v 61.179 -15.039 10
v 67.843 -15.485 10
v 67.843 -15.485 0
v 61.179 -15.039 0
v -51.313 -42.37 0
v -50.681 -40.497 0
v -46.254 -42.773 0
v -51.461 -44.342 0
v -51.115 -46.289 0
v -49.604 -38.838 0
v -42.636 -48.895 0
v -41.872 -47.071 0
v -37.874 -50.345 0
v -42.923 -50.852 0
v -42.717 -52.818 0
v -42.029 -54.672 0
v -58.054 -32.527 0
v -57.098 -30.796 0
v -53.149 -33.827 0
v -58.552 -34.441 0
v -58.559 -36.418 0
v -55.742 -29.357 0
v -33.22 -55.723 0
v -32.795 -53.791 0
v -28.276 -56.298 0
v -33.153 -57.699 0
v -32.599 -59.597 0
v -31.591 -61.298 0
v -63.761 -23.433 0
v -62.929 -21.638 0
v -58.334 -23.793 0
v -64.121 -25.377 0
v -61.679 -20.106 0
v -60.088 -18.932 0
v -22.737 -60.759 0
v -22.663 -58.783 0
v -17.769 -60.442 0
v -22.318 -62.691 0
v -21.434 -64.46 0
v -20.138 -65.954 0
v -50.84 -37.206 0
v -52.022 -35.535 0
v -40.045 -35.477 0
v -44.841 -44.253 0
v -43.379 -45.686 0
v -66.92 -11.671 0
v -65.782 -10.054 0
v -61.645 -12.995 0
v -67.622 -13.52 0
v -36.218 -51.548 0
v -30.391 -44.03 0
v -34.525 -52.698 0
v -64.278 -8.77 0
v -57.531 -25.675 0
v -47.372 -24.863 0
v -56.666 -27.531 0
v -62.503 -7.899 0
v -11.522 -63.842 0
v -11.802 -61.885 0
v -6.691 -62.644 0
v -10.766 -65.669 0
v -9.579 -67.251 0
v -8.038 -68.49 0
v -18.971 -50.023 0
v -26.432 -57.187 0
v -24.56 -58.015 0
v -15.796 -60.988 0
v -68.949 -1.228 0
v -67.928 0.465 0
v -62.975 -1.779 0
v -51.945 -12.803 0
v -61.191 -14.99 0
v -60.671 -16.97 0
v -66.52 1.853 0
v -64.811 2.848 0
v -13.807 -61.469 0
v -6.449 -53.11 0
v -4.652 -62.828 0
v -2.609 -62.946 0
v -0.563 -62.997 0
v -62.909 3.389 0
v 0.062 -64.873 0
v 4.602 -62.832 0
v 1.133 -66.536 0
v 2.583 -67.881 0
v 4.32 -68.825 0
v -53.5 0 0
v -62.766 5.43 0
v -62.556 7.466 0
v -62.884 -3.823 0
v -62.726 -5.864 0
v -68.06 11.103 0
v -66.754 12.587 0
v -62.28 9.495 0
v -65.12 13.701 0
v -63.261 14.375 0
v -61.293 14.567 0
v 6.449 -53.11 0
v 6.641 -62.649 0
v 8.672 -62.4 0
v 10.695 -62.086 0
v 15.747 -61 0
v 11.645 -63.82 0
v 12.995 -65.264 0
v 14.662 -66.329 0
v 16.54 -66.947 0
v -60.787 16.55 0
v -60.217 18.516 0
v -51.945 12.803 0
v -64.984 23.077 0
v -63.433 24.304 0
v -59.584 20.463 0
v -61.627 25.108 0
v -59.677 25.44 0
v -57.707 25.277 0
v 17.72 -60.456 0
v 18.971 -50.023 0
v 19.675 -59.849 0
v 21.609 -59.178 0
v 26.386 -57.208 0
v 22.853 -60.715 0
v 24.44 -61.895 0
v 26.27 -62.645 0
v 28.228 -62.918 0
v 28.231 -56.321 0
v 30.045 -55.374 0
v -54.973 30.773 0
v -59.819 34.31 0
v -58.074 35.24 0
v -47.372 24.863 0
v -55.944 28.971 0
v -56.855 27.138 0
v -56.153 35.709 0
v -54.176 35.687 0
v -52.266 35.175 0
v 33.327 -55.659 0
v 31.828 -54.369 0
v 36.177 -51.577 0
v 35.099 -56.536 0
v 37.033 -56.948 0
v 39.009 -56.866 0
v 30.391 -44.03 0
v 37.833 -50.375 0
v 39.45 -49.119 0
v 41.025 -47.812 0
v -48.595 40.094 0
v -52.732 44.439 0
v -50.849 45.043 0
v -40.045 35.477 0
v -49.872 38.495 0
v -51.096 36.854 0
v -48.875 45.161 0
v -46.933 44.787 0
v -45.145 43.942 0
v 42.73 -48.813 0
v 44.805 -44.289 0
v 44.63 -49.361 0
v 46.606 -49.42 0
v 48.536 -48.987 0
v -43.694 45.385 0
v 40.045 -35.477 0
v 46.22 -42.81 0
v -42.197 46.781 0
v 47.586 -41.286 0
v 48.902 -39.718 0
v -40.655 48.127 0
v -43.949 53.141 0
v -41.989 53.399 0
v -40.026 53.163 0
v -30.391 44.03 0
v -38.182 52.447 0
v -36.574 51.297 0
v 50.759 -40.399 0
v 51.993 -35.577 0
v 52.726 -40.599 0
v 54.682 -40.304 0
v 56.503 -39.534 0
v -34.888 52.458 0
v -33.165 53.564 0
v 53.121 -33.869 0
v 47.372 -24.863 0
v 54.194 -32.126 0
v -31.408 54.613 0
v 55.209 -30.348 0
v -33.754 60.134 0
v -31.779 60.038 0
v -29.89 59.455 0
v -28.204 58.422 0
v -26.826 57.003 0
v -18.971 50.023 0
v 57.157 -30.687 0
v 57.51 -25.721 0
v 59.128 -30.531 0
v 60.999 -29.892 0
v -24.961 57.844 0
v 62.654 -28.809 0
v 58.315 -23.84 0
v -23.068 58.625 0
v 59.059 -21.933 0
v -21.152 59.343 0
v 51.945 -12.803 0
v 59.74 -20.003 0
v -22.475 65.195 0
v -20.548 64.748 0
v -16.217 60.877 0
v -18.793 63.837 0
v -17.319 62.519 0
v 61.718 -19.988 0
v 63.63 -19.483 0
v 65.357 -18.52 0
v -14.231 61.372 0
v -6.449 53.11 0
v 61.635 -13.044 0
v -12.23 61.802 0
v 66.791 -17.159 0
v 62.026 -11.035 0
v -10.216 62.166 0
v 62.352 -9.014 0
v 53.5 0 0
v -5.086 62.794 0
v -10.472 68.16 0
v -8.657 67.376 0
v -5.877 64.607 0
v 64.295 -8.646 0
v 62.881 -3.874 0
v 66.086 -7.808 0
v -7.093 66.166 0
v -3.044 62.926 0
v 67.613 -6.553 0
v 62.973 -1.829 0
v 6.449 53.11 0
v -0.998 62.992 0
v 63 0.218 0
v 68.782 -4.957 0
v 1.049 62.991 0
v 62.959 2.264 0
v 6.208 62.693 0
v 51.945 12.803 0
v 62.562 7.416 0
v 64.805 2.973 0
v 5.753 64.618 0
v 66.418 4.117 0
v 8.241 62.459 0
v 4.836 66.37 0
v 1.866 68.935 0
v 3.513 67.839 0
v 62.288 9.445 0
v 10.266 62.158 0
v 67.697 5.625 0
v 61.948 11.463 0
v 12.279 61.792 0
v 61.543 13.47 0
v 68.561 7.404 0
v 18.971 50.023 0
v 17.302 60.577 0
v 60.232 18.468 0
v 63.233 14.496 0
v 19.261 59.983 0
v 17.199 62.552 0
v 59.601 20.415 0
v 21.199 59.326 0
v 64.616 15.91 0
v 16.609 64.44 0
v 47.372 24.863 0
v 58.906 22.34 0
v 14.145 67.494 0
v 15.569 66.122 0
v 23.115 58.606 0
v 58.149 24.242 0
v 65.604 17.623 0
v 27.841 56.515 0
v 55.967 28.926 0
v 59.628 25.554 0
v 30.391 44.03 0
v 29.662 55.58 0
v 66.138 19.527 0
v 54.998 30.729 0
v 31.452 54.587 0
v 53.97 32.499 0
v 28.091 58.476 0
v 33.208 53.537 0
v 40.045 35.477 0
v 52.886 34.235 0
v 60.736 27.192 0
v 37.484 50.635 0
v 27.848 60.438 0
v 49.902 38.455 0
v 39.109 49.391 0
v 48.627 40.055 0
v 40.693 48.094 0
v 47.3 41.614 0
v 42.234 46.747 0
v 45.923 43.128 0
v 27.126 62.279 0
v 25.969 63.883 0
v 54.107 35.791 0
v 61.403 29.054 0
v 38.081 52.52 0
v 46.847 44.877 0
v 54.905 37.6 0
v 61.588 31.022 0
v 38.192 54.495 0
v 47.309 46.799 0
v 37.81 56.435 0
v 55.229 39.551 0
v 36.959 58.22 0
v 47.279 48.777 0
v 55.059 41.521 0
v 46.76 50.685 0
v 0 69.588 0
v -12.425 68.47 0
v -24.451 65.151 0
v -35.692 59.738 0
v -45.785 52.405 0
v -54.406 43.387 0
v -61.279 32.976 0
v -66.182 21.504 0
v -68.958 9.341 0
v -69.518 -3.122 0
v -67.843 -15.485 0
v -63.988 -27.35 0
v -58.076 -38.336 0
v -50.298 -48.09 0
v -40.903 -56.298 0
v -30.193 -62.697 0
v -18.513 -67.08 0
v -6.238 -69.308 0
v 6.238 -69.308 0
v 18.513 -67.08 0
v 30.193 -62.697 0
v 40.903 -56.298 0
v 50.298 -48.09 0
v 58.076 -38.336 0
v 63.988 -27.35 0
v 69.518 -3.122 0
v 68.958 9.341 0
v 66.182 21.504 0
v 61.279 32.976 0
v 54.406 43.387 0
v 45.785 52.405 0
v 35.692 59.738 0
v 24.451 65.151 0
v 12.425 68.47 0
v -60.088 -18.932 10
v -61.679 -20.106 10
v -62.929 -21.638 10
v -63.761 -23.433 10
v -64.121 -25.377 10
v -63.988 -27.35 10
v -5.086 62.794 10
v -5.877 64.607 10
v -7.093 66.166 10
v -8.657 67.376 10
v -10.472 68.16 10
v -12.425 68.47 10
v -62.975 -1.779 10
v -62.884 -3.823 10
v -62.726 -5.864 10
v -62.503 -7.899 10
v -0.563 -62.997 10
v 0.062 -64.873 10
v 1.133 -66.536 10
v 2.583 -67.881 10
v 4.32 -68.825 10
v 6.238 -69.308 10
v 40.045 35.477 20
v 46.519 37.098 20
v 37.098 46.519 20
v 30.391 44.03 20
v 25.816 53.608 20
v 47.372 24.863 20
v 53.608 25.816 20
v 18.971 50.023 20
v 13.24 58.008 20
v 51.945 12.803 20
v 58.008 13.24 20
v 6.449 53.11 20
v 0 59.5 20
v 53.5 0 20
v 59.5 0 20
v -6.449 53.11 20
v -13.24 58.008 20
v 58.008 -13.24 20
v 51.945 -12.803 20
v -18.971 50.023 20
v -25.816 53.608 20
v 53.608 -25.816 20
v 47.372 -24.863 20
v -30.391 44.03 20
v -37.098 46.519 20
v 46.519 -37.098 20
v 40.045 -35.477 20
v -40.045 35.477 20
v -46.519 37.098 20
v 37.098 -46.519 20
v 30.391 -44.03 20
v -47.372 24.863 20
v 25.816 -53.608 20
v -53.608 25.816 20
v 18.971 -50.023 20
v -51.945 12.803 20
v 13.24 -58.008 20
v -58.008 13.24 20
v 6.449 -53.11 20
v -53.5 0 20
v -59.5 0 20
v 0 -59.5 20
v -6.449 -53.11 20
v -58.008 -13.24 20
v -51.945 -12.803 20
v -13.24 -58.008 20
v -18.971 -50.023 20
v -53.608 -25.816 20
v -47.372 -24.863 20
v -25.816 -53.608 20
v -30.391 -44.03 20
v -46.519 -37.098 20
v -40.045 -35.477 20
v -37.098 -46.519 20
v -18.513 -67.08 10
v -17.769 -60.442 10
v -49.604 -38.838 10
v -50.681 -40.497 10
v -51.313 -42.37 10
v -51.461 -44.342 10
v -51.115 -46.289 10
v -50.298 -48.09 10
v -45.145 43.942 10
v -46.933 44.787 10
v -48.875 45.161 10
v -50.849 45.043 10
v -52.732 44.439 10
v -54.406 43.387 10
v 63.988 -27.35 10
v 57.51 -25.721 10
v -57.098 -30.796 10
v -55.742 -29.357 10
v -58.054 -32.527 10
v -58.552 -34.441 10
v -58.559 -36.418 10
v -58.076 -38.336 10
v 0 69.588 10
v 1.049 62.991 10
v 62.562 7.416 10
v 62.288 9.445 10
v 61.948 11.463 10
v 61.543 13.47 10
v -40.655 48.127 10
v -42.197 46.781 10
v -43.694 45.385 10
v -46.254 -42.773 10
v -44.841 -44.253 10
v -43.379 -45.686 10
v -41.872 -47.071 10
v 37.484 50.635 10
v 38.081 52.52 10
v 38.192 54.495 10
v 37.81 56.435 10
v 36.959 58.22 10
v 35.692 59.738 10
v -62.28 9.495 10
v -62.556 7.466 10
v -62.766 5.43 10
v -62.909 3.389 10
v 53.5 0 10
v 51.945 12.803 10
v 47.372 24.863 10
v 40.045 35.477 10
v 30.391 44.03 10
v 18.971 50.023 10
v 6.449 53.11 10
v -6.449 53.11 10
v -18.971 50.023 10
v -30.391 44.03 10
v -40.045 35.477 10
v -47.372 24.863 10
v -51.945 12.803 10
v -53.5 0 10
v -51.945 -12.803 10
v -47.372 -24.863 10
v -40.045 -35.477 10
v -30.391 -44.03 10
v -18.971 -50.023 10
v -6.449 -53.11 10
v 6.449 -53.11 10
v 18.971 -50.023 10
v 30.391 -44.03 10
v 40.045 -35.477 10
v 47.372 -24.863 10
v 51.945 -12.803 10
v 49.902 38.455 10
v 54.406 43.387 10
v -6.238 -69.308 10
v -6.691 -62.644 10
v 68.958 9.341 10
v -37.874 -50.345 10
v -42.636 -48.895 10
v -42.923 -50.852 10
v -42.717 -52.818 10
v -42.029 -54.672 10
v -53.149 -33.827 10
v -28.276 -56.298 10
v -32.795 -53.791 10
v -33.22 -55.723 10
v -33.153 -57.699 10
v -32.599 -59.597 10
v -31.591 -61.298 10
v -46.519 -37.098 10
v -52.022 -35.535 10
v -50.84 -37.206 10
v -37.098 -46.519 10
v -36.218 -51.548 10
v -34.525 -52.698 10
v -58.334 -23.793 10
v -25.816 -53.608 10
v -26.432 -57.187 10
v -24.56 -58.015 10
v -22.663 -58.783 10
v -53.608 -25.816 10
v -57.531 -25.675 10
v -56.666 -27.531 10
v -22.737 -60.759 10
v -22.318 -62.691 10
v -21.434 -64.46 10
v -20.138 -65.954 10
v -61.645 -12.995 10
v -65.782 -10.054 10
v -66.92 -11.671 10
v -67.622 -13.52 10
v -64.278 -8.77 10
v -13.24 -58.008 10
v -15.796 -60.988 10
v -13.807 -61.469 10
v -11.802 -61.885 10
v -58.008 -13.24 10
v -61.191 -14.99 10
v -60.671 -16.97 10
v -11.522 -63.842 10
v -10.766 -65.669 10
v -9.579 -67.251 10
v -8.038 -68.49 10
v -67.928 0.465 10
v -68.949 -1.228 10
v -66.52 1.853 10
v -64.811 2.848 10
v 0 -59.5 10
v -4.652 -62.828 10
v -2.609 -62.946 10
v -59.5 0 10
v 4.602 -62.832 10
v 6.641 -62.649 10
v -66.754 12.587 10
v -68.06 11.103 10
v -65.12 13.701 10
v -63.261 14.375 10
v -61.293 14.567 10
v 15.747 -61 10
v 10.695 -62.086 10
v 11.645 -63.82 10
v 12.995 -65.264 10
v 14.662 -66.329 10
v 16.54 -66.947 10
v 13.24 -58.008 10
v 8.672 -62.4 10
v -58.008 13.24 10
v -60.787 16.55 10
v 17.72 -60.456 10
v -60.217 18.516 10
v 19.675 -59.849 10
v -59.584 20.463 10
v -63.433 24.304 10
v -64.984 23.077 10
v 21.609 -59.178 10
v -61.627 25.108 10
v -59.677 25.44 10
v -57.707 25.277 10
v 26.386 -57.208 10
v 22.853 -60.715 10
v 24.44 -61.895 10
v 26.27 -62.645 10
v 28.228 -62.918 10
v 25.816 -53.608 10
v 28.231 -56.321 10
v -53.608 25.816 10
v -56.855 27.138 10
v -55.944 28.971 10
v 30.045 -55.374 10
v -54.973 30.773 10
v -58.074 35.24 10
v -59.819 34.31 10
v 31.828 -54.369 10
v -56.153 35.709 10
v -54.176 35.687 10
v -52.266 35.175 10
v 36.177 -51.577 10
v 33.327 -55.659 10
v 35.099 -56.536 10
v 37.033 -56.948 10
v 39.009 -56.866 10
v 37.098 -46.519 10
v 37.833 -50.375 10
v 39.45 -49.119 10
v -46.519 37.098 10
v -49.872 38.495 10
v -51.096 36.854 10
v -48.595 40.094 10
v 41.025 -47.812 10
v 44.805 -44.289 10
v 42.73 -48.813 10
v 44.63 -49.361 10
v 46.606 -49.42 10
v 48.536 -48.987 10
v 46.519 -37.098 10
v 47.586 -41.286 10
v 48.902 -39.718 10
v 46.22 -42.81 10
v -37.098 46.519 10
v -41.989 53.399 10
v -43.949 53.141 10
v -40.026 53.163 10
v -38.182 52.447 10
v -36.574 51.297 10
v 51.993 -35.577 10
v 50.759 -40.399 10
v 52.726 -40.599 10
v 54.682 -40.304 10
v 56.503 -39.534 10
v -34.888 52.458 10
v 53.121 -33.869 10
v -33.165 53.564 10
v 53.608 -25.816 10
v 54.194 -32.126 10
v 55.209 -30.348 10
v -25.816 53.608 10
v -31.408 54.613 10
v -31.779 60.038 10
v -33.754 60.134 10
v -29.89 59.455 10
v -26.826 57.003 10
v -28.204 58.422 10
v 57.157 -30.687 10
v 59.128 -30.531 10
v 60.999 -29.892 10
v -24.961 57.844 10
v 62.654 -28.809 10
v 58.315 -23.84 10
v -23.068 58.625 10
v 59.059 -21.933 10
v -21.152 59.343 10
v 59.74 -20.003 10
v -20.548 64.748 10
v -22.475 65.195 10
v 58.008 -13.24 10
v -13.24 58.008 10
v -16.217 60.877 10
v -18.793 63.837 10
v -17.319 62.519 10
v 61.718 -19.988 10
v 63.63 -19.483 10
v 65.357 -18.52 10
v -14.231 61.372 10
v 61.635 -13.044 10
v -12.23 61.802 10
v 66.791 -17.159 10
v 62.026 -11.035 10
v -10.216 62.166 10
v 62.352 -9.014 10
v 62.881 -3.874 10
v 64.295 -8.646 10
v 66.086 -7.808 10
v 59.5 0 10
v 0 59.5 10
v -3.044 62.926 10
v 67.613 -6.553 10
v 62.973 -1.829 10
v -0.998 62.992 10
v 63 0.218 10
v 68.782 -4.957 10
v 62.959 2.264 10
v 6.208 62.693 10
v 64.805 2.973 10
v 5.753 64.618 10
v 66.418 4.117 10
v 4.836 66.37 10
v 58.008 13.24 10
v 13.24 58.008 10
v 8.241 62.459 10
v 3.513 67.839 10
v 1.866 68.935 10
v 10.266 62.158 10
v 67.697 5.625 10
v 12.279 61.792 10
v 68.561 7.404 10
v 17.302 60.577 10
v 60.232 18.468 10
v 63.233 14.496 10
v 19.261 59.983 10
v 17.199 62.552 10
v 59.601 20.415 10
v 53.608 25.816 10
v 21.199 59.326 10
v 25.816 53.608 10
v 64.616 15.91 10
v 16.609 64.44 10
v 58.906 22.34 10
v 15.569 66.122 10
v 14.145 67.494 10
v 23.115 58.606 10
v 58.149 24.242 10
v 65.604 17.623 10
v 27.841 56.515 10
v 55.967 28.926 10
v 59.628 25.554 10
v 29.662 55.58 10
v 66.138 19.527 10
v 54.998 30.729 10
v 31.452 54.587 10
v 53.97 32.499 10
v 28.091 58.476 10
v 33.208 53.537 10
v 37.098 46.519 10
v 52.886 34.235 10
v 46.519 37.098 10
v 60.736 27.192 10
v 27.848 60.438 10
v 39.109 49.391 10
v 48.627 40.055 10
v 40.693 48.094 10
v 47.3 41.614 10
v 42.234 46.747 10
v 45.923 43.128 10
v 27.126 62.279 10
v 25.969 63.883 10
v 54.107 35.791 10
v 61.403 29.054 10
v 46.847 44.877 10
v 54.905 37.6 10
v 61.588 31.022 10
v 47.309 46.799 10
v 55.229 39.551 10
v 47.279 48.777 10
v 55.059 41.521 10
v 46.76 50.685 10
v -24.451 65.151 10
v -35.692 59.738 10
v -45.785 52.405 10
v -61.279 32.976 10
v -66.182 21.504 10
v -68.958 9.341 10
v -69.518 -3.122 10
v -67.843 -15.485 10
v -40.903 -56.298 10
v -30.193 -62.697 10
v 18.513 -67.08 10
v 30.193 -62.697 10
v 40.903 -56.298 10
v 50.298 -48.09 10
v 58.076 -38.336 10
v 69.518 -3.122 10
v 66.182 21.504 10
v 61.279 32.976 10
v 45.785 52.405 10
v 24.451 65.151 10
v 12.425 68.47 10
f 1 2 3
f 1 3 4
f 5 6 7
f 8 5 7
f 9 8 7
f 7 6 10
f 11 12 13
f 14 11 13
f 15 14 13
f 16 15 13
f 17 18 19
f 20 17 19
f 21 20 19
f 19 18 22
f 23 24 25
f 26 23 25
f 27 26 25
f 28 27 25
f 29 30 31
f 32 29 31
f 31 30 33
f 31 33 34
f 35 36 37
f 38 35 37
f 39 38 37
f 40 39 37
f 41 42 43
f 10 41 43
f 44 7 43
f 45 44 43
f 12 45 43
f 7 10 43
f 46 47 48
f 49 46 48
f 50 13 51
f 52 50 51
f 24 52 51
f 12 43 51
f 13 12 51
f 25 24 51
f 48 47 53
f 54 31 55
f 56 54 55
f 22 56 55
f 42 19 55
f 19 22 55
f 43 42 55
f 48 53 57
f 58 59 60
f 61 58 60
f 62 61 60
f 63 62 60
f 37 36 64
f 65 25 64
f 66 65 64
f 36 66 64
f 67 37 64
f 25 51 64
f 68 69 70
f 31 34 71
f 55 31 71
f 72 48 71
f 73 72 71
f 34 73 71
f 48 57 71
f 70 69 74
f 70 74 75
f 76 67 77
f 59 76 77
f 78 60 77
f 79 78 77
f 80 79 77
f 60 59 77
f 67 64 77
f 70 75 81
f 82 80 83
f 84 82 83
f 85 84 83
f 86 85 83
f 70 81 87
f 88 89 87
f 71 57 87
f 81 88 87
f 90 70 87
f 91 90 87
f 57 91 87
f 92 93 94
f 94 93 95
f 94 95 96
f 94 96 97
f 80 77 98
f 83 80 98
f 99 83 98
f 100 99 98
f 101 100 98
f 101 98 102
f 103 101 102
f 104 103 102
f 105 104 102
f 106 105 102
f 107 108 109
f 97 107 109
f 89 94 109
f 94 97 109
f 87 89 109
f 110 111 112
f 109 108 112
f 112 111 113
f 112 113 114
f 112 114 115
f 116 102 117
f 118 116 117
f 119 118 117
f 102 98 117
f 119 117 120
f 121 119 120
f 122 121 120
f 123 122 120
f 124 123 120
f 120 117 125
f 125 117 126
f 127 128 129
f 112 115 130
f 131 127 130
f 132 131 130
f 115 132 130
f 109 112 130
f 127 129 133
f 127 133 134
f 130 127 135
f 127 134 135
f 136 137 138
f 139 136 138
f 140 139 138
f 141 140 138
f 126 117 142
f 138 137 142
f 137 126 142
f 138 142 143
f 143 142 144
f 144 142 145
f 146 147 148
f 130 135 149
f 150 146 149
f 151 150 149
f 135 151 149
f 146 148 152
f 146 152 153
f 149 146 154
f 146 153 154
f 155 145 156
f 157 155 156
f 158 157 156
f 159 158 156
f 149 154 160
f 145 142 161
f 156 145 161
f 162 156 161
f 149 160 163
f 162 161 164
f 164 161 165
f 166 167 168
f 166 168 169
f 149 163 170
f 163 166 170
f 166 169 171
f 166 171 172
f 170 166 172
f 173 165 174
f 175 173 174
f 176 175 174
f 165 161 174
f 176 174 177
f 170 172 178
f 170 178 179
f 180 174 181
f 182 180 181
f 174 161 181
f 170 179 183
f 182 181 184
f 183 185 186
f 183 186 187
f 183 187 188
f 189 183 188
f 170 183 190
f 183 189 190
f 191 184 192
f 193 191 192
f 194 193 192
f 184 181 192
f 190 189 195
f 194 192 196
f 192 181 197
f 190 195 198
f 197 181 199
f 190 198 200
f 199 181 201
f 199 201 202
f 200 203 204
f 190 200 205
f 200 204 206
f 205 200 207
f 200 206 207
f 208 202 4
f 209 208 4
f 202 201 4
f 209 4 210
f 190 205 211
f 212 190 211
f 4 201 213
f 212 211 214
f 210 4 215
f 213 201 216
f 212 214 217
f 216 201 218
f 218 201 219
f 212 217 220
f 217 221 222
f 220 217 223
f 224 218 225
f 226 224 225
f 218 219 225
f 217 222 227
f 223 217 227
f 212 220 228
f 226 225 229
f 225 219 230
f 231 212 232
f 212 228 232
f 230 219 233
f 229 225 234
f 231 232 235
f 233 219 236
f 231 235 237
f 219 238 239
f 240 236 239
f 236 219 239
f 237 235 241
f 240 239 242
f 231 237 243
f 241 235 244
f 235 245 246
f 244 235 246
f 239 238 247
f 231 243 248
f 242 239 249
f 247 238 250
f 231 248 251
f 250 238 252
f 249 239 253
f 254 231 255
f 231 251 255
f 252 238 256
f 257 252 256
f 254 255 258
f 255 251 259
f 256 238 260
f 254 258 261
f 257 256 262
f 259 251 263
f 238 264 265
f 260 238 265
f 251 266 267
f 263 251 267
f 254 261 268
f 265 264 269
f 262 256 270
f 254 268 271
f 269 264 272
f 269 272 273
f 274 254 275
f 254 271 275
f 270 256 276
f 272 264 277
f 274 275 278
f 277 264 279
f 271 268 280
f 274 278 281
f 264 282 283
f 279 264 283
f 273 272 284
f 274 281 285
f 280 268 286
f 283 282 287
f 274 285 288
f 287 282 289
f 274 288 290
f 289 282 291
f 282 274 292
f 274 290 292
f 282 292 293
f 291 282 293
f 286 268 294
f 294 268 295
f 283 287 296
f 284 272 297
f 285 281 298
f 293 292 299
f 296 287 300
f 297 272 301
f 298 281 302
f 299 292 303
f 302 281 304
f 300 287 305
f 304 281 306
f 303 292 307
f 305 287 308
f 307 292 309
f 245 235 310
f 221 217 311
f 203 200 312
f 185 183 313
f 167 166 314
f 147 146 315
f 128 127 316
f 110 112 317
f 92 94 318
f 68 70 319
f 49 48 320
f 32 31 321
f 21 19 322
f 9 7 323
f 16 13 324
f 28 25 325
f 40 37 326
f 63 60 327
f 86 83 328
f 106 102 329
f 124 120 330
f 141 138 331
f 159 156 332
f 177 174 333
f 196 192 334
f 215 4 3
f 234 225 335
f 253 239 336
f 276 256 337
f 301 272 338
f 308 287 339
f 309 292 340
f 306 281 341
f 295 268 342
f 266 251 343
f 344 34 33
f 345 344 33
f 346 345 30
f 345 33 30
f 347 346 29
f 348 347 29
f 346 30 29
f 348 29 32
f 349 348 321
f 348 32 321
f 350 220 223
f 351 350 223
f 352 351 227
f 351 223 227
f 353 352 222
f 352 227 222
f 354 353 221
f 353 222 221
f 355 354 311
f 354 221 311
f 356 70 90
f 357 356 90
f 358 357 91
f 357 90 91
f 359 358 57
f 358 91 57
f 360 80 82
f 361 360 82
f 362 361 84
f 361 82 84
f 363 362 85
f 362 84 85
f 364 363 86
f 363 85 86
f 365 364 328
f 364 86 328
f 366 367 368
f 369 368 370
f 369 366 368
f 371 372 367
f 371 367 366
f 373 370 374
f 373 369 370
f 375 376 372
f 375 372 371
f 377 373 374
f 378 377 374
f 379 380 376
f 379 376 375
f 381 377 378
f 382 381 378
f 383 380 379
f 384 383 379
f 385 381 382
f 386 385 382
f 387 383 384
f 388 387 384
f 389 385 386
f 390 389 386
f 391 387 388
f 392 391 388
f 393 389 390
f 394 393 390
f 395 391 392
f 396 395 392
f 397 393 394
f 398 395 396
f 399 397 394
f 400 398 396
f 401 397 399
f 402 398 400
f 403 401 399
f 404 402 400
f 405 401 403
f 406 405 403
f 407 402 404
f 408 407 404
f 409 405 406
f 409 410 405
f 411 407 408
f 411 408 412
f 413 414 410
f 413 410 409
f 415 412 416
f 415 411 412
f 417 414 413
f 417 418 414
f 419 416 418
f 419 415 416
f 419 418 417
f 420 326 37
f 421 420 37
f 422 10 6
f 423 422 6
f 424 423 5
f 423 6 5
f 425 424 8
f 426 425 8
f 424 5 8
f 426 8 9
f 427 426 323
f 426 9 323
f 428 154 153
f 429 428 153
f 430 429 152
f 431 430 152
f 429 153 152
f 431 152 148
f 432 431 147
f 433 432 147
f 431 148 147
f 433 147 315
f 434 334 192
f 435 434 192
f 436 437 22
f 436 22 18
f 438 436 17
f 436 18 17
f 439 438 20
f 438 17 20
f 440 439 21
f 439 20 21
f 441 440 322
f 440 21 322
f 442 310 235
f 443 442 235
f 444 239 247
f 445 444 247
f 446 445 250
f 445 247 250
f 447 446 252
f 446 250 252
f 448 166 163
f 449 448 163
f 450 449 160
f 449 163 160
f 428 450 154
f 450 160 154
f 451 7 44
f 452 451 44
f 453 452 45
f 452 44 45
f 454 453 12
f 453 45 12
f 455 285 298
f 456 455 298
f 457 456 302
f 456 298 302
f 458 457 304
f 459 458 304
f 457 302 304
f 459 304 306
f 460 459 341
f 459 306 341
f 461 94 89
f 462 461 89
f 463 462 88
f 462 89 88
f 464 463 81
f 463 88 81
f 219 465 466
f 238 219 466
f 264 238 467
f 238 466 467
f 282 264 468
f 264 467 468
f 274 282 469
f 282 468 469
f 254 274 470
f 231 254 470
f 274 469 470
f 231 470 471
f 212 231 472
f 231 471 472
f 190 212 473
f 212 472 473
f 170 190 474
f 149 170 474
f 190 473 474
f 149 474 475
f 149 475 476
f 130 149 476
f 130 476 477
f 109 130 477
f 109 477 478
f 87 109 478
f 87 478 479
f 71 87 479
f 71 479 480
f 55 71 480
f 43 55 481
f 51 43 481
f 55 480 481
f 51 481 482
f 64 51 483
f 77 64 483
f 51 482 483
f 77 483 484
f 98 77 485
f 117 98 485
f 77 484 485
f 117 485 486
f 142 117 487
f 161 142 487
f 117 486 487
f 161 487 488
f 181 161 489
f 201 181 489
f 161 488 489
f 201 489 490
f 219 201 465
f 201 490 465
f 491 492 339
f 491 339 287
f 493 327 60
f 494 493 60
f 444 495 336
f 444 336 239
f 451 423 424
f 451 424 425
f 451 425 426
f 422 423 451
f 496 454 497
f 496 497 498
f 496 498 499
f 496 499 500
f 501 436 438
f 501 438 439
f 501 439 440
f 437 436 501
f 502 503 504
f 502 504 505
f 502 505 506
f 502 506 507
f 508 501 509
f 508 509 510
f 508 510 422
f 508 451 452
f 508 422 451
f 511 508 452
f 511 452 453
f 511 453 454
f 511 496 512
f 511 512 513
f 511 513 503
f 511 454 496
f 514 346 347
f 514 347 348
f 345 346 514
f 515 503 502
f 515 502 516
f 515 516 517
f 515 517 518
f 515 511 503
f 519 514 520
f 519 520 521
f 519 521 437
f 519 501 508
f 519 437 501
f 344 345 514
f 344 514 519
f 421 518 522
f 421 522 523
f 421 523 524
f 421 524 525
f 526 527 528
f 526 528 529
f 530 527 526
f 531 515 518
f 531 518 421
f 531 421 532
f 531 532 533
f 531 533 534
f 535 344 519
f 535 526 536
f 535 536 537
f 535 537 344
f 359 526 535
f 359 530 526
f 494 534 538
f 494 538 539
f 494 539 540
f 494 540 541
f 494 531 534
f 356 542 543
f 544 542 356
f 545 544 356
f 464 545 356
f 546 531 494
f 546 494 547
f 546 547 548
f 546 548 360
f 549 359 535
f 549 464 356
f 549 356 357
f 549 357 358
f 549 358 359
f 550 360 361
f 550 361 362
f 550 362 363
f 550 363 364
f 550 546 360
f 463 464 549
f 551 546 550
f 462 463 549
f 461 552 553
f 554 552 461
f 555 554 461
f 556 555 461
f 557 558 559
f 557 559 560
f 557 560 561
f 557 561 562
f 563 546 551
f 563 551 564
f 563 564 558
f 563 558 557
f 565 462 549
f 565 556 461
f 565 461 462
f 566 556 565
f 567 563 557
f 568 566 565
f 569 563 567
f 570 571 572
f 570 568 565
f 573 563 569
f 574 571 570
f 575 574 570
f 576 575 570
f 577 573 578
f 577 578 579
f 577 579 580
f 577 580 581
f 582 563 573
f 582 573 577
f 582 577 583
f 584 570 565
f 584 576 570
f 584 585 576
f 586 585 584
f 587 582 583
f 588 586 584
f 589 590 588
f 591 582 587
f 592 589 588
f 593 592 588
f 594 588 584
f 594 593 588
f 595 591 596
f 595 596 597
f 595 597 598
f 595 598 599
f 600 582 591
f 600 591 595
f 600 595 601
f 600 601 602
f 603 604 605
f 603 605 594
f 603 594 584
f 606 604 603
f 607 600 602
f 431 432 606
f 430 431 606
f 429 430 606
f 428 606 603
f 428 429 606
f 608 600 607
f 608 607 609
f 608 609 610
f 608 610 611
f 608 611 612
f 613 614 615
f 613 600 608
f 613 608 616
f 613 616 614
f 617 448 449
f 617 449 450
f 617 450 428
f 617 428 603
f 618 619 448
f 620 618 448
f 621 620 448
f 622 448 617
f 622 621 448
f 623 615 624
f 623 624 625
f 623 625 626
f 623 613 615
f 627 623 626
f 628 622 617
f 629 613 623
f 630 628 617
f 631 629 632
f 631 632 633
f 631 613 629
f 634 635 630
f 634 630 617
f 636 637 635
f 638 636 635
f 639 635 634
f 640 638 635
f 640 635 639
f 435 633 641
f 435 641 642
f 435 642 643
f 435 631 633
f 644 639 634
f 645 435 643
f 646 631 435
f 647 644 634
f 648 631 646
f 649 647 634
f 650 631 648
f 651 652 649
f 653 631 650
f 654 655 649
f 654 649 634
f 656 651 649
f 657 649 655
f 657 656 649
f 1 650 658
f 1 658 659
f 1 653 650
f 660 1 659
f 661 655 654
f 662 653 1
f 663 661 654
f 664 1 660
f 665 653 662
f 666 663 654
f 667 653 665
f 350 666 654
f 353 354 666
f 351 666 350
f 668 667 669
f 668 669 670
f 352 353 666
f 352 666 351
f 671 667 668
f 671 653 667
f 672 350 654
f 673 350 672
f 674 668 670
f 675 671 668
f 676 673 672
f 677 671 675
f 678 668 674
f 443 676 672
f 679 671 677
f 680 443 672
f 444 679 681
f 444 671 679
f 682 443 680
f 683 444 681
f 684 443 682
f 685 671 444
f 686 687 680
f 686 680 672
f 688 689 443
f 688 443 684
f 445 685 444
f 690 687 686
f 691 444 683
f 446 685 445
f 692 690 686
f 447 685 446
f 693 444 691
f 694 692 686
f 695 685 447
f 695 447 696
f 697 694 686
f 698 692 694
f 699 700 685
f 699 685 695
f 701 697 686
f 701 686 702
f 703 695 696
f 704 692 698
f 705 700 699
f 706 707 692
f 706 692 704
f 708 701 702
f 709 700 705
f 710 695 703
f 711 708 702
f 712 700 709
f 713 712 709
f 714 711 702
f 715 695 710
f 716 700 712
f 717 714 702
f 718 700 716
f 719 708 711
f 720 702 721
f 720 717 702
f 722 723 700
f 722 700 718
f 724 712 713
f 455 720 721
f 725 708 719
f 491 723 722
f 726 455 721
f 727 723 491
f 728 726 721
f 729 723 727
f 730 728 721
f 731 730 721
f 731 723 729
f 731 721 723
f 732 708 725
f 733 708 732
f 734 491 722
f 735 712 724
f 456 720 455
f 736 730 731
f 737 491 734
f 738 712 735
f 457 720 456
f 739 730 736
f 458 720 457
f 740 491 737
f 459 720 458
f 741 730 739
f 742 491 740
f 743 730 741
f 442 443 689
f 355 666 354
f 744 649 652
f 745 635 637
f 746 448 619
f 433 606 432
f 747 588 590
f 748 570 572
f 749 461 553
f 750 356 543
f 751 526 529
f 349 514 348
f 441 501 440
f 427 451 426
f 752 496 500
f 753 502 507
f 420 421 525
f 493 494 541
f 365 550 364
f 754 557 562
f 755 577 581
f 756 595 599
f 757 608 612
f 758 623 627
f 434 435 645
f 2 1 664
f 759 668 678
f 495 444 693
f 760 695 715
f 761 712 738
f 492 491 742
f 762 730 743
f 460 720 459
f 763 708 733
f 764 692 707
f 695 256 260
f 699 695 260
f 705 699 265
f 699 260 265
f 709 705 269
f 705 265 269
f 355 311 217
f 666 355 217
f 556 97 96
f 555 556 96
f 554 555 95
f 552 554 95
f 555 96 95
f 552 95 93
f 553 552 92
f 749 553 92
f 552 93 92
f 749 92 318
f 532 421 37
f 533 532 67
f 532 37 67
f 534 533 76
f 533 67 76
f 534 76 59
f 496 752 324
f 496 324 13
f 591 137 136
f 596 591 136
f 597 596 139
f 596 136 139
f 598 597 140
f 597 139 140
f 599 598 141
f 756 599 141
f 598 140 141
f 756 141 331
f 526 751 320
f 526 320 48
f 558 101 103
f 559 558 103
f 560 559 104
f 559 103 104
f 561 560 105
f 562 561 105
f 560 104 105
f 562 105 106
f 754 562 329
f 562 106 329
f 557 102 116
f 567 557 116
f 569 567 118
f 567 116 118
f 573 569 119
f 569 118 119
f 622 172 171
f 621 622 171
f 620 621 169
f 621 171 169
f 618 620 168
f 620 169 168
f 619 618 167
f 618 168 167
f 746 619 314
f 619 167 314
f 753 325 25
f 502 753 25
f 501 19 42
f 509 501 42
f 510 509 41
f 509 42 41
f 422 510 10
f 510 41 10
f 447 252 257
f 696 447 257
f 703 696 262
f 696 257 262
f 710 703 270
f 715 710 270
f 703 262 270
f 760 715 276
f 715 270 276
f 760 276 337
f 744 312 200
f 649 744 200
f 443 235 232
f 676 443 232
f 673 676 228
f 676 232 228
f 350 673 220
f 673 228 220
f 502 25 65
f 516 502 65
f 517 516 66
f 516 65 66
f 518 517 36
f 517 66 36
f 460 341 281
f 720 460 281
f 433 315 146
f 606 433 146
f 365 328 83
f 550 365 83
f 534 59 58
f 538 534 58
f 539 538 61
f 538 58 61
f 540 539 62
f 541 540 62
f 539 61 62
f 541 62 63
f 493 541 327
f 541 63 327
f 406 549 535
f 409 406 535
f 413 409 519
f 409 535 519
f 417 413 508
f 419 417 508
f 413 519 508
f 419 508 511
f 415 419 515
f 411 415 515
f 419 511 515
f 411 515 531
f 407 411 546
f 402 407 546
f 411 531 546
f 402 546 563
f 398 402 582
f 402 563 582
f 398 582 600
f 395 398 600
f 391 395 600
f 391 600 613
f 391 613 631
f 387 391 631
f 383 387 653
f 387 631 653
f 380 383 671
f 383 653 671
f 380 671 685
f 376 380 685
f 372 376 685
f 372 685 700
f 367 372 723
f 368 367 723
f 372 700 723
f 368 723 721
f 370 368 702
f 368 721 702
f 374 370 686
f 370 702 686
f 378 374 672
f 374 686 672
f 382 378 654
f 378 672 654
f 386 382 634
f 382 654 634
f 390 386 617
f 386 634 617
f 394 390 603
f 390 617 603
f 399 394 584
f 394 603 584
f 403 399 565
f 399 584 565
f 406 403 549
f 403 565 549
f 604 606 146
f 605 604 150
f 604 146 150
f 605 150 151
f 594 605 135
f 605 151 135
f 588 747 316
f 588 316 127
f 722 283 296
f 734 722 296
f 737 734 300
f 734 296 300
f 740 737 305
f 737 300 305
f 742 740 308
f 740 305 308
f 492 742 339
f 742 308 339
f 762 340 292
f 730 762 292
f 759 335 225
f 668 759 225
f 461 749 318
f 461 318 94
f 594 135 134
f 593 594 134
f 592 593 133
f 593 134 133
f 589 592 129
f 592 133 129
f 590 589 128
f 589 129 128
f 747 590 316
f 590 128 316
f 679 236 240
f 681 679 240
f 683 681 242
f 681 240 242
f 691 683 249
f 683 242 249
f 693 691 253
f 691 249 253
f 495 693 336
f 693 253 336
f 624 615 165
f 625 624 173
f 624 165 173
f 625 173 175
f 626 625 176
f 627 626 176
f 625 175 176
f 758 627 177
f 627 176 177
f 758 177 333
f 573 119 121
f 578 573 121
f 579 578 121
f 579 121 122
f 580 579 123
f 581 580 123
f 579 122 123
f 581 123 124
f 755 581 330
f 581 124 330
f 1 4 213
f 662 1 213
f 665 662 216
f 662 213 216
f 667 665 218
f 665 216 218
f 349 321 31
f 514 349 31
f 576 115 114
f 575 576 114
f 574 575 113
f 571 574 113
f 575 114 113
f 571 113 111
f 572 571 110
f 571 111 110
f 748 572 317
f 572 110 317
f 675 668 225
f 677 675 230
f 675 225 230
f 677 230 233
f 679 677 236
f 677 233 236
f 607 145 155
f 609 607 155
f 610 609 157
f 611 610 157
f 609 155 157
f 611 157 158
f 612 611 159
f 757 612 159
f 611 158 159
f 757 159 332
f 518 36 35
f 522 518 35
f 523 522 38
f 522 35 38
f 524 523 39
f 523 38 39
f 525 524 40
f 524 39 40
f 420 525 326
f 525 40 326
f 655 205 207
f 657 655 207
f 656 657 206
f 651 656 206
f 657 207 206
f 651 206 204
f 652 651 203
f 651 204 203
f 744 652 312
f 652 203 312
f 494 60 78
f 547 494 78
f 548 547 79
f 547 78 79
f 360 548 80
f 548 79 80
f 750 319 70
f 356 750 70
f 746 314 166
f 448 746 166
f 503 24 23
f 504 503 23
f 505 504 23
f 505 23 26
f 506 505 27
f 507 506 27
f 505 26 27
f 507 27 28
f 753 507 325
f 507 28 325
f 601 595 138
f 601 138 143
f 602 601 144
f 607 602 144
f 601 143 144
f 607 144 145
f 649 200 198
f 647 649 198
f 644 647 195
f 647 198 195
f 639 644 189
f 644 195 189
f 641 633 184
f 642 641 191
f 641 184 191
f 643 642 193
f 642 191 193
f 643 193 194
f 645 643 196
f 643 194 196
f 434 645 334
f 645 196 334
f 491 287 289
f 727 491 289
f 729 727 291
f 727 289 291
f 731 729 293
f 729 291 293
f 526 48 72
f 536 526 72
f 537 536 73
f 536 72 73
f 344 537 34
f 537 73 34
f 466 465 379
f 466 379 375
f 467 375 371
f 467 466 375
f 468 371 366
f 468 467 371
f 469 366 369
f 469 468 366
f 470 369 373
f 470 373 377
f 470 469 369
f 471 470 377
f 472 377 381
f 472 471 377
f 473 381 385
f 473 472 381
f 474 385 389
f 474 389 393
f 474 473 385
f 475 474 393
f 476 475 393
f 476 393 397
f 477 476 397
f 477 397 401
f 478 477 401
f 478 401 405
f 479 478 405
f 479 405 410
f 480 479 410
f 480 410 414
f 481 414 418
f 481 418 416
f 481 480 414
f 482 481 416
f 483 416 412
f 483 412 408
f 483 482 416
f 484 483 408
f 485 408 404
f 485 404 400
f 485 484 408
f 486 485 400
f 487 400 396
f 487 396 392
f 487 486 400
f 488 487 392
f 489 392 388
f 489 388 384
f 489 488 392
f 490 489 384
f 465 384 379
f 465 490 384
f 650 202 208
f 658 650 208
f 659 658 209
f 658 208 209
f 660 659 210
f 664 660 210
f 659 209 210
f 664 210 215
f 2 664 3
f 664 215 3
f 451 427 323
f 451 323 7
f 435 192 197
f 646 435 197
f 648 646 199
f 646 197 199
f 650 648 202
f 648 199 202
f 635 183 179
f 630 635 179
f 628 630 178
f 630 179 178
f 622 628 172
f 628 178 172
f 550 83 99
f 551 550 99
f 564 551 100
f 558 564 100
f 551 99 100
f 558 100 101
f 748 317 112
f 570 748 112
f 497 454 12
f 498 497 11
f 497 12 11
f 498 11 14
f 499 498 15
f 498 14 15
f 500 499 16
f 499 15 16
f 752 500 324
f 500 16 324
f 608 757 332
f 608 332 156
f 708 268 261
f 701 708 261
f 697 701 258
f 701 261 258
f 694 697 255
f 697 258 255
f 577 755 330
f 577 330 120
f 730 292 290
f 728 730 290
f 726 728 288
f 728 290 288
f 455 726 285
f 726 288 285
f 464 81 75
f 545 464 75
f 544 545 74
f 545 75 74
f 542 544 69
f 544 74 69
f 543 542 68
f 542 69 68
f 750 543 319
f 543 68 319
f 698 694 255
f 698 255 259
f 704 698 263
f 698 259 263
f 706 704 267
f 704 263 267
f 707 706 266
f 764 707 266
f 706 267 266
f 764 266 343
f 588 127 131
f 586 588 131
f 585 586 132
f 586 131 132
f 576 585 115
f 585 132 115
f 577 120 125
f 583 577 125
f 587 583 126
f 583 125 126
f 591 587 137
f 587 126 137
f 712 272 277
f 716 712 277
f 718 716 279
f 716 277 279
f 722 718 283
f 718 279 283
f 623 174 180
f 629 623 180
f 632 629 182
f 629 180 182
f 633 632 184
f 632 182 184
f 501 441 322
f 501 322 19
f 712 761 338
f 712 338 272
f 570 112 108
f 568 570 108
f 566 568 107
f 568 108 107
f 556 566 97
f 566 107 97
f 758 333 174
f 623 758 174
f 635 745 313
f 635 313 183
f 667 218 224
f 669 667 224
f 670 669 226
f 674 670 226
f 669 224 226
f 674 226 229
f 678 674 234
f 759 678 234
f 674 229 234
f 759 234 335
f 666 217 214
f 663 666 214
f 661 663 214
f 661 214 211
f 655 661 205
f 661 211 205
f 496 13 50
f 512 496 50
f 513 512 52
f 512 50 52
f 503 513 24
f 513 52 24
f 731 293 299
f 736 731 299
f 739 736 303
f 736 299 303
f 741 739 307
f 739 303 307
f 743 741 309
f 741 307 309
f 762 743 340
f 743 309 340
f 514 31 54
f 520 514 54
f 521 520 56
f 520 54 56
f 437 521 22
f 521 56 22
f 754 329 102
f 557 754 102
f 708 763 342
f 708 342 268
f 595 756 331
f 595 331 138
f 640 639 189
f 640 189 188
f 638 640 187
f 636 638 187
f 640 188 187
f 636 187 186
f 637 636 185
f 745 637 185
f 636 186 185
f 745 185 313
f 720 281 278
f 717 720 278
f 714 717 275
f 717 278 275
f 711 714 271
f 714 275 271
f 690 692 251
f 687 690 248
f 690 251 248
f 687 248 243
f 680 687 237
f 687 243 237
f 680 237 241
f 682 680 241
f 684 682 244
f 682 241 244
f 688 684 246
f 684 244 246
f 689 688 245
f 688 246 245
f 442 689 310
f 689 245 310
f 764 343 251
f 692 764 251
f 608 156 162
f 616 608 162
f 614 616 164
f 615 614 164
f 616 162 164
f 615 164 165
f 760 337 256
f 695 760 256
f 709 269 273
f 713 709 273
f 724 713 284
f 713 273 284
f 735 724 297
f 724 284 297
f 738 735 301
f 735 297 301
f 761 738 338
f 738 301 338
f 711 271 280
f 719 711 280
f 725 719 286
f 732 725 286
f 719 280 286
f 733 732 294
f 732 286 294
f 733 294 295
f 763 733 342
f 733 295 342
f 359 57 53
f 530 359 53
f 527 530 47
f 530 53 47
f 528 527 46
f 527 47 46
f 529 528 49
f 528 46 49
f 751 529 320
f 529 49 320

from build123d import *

# Parameters (mm, degrees)
BOSS_EXTRUDE1_DEPTH = 10
SKETCH2_R           = 59.5
SKETCH2_R_2         = 53.5
BOSS_EXTRUDE2_DEPTH = 10
SKETCH3_R           = 53.5
CUT_EXTRUDE4_DEPTH  = 10


with BuildPart() as part:
    # Sketch1 → Boss-Extrude1 (new body)
    with BuildSketch(Plane.XY):
        with BuildLine():
            Line((0, 69.588014501), (1.048611539, 62.991272521))
            ThreePointArc((1.048611539, 62.991272521), (-2.021331039, 62.967564832), (-5.0864736, 62.794329253))
            ThreePointArc((-5.0864736, 62.794329253), (-7.836974129, 66.820360054), (-12.425419784, 68.469706479))
            Line((-12.425419784, 68.469706479), (-10.2157661, 62.166213677))
            ThreePointArc((-10.2157661, 62.166213677), (-13.232140267, 61.594727566), (-16.217092319, 60.876973617))
            ThreePointArc((-16.217092319, 60.876973617), (-19.642266731, 64.347183613), (-24.451476353, 65.150725754))
            Line((-24.451476353, 65.150725754), (-21.151800612, 59.343081576))
            ThreePointArc((-21.151800612, 59.343081576), (-24.017657619, 58.242185077), (-26.826480348, 57.002981958))
            ThreePointArc((-26.826480348, 57.002981958), (-30.816240719, 59.805835745), (-35.691642354, 59.737747098))
            Line((-35.691642354, 59.737747098), (-31.407998848, 54.612614004))
            ThreePointArc((-31.407998848, 54.612614004), (-34.031227694, 53.017690837), (-36.573643225, 51.296867558))
            ThreePointArc((-36.573643225, 51.296867558), (-40.999755374, 53.342279108), (-45.784649601, 52.404748097))
            Line((-45.784649601, 52.404748097), (-40.654718159, 48.126852083))
            ThreePointArc((-40.654718159, 48.126852083), (-42.951006109, 46.08916439), (-45.145299116, 43.942029627))
            ThreePointArc((-45.145299116, 43.942029627), (-49.865504157, 45.164257731), (-54.406100539, 43.387417373))
            Line((-54.406100539, 43.387417373), (-48.594761377, 40.094253538))
            ThreePointArc((-48.594761377, 40.094253538), (-50.490303849, 37.679294278), (-52.265947947, 35.174858708))
            ThreePointArc((-52.265947947, 35.174858708), (-57.128534607, 35.534619949), (-61.27889464, 32.975579356))
            Line((-61.27889464, 32.975579356), (-54.97292898, 30.772992693))
            ThreePointArc((-54.97292898, 30.772992693), (-56.406801678, 28.058380645), (-57.706726208, 25.277138889))
            ThreePointArc((-57.706726208, 25.277138889), (-62.555406949, 24.762870243), (-66.182134647, 21.503879086))
            Line((-66.182134647, 21.503879086), (-59.584221415, 20.462662544))
            ThreePointArc((-59.584221415, 20.462662544), (-60.510338491, 17.535647571), (-61.292762806, 14.566991027))
            ThreePointArc((-61.292762806, 14.566991027), (-65.97169704, 13.195221514), (-68.958226392, 9.341026448))
            Line((-68.958226392, 9.341026448), (-62.280427947, 9.494645584))
            ThreePointArc((-62.280427947, 9.494645584), (-62.669023236, 6.449304357), (-62.908799576, 3.388648088))
            ThreePointArc((-62.908799576, 3.388648088), (-67.267602508, 1.203467507), (-69.517944001, -3.122054465))
            Line((-69.517944001, -3.122054465), (-62.97489028, -1.778537098))
            ThreePointArc((-62.97489028, -1.778537098), (-62.81347401, -4.844324807), (-62.502895767, -7.898608789))
            ThreePointArc((-62.502895767, -7.898608789), (-66.401471883, -10.826966935), (-67.84329769, -15.484789979))
            Line((-67.84329769, -15.484789979), (-61.645287824, -12.994556134))
            ThreePointArc((-61.645287824, -12.994556134), (-60.939048046, -15.982253385), (-60.088097459, -18.93199788))
            ThreePointArc((-60.088097459, -18.93199788), (-63.401143316, -22.509413752), (-63.98811197, -27.349831602))
            Line((-63.98811197, -27.349831602), (-58.334355095, -23.792919443))
            ThreePointArc((-58.334355095, -23.792919443), (-57.105990937, -26.606499189), (-55.742018259, -29.356896982))
            ThreePointArc((-55.742018259, -29.356896982), (-58.363049836, -33.468389489), (-58.076295682, -38.335827134))
            Line((-58.076295682, -38.335827134), (-53.148508196, -33.826558745))
            ThreePointArc((-53.148508196, -33.826558745), (-51.437500293, -36.375590217), (-49.604344727, -38.83824126))
            ThreePointArc((-49.604344727, -38.83824126), (-51.449119914, -43.351663651), (-50.297859465, -48.089677639))
            Line((-50.297859465, -48.089677639), (-46.254424513, -42.772984617))
            ThreePointArc((-46.254424513, -42.772984617), (-44.115766066, -44.975539846), (-41.872346741, -47.071292508))
            ThreePointArc((-41.872346741, -47.071292508), (-42.881572944, -51.841579673), (-40.90280866, -56.297886336))
            Line((-40.90280866, -56.297886336), (-37.873685567, -50.344651569))
            ThreePointArc((-37.873685567, -50.344651569), (-35.376114819, -52.129938618), (-32.794537078, -53.791433684))
            ThreePointArc((-32.794537078, -53.791433684), (-32.935776938, -58.665264669), (-30.193107929, -62.696634645))
            Line((-30.193107929, -62.696634645), (-28.275655205, -56.298199996))
            ThreePointArc((-28.275655205, -56.298199996), (-25.499446135, -57.60883827), (-22.66268401, -58.782673922))
            ThreePointArc((-22.66268401, -58.782673922), (-21.931397961, -63.603399789), (-18.512975867, -67.080261528))
            Line((-18.512975867, -67.080261528), (-17.768822019, -60.442277952))
            ThreePointArc((-17.768822019, -60.442277952), (-14.80320427, -61.23614246), (-11.802433631, -61.884590654))
            ThreePointArc((-11.802433631, -61.884590654), (-10.222125808, -66.497269306), (-6.237821528, -69.307873613))
            Line((-6.237821528, -69.307873613), (-6.690884273, -62.643691363))
            ThreePointArc((-6.690884273, -62.643691363), (-3.631175241, -62.895266645), (-0.562843324, -62.997485723))
            ThreePointArc((-0.562843324, -62.997485723), (1.815693879, -67.253861874), (6.237821528, -69.307873613))
            Line((6.237821528, -69.307873613), (4.602103998, -62.831684991))
            ThreePointArc((4.602103998, -62.831684991), (7.657562749, -62.53288521), (10.69483723, -62.085589766))
            ThreePointArc((10.69483723, -62.085589766), (13.795155671, -65.848859984), (18.512975867, -67.080261528))
            Line((18.512975867, -67.080261528), (15.74717686, -61.000216565))
            ThreePointArc((15.74717686, -61.000216565), (18.700180371, -60.160645393), (21.608776916, -59.17821187))
            ThreePointArc((21.608776916, -59.17821187), (25.331229809, -62.327421554), (30.193107929, -62.696634645))
            Line((30.193107929, -62.696634645), (26.386122502, -57.208150987))
            ThreePointArc((26.386122502, -57.208150987), (29.14175881, -55.854792932), (31.828192733, -54.368797553))
            ThreePointArc((31.828192733, -54.368797553), (36.053137378, -56.802728512), (40.90280866, -56.297886336))
            Line((40.90280866, -56.297886336), (36.176996455, -51.577368365))
            ThreePointArc((36.176996455, -51.577368365), (38.646697142, -49.753721469), (41.024624246, -47.811925348))
            ThreePointArc((41.024624246, -47.811925348), (45.616267447, -49.452349038), (50.297859465, -48.089677639))
            Line((50.297859465, -48.089677639), (44.805111976, -44.288846686))
            ThreePointArc((44.805111976, -44.288846686), (46.90949883, -42.05352446), (48.902490582, -39.718338522))
            ThreePointArc((48.902490582, -39.718338522), (53.713253147, -40.512530377), (58.076295682, -38.335827134))
            Line((58.076295682, -38.335827134), (51.993154332, -35.576845034))
            ThreePointArc((51.993154332, -35.576845034), (53.664590628, -33.001692573), (55.208590632, -30.348171615))
            ThreePointArc((55.208590632, -30.348171615), (60.083850696, -30.270605655), (63.98811197, -27.349831602))
            Line((63.98811197, -27.349831602), (57.510093928, -25.72137431))
            ThreePointArc((57.510093928, -25.72137431), (58.694858328, -22.889159134), (59.740241154, -20.002589503))
            ThreePointArc((59.740241154, -20.002589503), (64.523303846, -19.055758761), (67.84329769, -15.484789979))
            Line((67.84329769, -15.484789979), (61.178611786, -15.039197451))
            ThreePointArc((61.178611786, -15.039197451), (61.838624987, -12.040949286), (62.351791171, -9.014107705))
            ThreePointArc((62.351791171, -9.014107705), (66.888924921, -7.228444101), (69.517944001, -3.122054465))
            Line((69.517944001, -3.122054465), (62.880798722, -3.873648413))
            ThreePointArc((62.880798722, -3.873648413), (62.994847358, -0.805733421), (62.959303317, 2.264094931))
            ThreePointArc((62.959303317, 2.264094931), (67.104680912, 4.8311987), (68.958226392, 9.341026448))
            Line((68.958226392, 9.341026448), (62.56194505, 7.416402873))
            ThreePointArc((62.56194505, 7.416402873), (62.126363502, 10.455379379), (61.543251651, 13.469527693))
            ThreePointArc((61.543251651, 13.469527693), (65.163637245, 16.735562799), (66.182134647, 21.503879086))
            Line((66.182134647, 21.503879086), (60.232298987, 18.468084869))
            ThreePointArc((60.232298987, 18.468084869), (59.261087206, 21.380447683), (58.149149238, 24.242038752))
            ThreePointArc((58.149149238, 24.242038752), (61.12818066, 28.10203214), (61.27889464, 32.975579356))
            Line((61.27889464, 32.975579356), (55.966737276, 28.926187421))
            ThreePointArc((55.966737276, 28.926187421), (54.491110807, 31.618330807), (52.886085324, 34.235390739))
            ThreePointArc((52.886085324, 34.235390739), (55.128014052, 38.565279046), (54.406100539, 43.387417373))
            Line((54.406100539, 43.387417373), (49.902358579, 38.454578509))
            ThreePointArc((49.902358579, 38.454578509), (47.969745271, 40.839974763), (45.923219113, 43.128389099))
            ThreePointArc((45.923219113, 43.128389099), (47.355987713, 47.789006151), (45.784649601, 52.404748097))
            Line((45.784649601, 52.404748097), (42.234077017, 46.747007803))
            ThreePointArc((42.234077017, 46.747007803), (39.906592652, 48.748988327), (37.484342854, 50.635205547))
            ThreePointArc((37.484342854, 50.635205547), (38.061900964, 55.476755278), (35.691642354, 59.737747098))
            Line((35.691642354, 59.737747098), (33.20835747, 53.536949802))
            ThreePointArc((33.20835747, 53.536949802), (30.560809311, 55.091169295), (27.840688973, 56.514564826))
            ThreePointArc((27.840688973, 56.514564826), (27.544473401, 61.381435844), (24.451476353, 65.150725754))
            Line((24.451476353, 65.150725754), (23.11529399, 58.606170185))
            ThreePointArc((23.11529399, 58.606170185), (20.232776412, 59.662674753), (17.302212441, 60.577499491))
            ThreePointArc((17.302212441, 60.577499491), (16.141743799, 65.313266557), (12.425419784, 68.469706479))
            Line((12.425419784, 68.469706479), (12.279285941, 61.791740037))
            ThreePointArc((12.279285941, 61.791740037), (9.254445432, 62.316572754), (6.207628565, 62.69342348))
            ThreePointArc((6.207628565, 62.69342348), (4.22020527, 67.145875143), (0, 69.588014501))
        make_face()
    extrude(amount=BOSS_EXTRUDE1_DEPTH)

    # Sketch2 → Boss-Extrude2 (add)
    with BuildSketch(Plane.XY.offset(10)):
        with Locations(Location((0, 0, 0), (0, 0, 180))):  # turned: the seam where the file's is
            Circle(SKETCH2_R)
        Circle(SKETCH2_R_2, mode=Mode.SUBTRACT)
    extrude(amount=BOSS_EXTRUDE2_DEPTH)

    # Sketch3 → Cut-Extrude4 (cut)
    with BuildSketch(Plane.XY.offset(10)):
        Circle(SKETCH3_R)
    extrude(amount=-CUT_EXTRUDE4_DEPTH, mode=Mode.SUBTRACT)


solid = part.part
